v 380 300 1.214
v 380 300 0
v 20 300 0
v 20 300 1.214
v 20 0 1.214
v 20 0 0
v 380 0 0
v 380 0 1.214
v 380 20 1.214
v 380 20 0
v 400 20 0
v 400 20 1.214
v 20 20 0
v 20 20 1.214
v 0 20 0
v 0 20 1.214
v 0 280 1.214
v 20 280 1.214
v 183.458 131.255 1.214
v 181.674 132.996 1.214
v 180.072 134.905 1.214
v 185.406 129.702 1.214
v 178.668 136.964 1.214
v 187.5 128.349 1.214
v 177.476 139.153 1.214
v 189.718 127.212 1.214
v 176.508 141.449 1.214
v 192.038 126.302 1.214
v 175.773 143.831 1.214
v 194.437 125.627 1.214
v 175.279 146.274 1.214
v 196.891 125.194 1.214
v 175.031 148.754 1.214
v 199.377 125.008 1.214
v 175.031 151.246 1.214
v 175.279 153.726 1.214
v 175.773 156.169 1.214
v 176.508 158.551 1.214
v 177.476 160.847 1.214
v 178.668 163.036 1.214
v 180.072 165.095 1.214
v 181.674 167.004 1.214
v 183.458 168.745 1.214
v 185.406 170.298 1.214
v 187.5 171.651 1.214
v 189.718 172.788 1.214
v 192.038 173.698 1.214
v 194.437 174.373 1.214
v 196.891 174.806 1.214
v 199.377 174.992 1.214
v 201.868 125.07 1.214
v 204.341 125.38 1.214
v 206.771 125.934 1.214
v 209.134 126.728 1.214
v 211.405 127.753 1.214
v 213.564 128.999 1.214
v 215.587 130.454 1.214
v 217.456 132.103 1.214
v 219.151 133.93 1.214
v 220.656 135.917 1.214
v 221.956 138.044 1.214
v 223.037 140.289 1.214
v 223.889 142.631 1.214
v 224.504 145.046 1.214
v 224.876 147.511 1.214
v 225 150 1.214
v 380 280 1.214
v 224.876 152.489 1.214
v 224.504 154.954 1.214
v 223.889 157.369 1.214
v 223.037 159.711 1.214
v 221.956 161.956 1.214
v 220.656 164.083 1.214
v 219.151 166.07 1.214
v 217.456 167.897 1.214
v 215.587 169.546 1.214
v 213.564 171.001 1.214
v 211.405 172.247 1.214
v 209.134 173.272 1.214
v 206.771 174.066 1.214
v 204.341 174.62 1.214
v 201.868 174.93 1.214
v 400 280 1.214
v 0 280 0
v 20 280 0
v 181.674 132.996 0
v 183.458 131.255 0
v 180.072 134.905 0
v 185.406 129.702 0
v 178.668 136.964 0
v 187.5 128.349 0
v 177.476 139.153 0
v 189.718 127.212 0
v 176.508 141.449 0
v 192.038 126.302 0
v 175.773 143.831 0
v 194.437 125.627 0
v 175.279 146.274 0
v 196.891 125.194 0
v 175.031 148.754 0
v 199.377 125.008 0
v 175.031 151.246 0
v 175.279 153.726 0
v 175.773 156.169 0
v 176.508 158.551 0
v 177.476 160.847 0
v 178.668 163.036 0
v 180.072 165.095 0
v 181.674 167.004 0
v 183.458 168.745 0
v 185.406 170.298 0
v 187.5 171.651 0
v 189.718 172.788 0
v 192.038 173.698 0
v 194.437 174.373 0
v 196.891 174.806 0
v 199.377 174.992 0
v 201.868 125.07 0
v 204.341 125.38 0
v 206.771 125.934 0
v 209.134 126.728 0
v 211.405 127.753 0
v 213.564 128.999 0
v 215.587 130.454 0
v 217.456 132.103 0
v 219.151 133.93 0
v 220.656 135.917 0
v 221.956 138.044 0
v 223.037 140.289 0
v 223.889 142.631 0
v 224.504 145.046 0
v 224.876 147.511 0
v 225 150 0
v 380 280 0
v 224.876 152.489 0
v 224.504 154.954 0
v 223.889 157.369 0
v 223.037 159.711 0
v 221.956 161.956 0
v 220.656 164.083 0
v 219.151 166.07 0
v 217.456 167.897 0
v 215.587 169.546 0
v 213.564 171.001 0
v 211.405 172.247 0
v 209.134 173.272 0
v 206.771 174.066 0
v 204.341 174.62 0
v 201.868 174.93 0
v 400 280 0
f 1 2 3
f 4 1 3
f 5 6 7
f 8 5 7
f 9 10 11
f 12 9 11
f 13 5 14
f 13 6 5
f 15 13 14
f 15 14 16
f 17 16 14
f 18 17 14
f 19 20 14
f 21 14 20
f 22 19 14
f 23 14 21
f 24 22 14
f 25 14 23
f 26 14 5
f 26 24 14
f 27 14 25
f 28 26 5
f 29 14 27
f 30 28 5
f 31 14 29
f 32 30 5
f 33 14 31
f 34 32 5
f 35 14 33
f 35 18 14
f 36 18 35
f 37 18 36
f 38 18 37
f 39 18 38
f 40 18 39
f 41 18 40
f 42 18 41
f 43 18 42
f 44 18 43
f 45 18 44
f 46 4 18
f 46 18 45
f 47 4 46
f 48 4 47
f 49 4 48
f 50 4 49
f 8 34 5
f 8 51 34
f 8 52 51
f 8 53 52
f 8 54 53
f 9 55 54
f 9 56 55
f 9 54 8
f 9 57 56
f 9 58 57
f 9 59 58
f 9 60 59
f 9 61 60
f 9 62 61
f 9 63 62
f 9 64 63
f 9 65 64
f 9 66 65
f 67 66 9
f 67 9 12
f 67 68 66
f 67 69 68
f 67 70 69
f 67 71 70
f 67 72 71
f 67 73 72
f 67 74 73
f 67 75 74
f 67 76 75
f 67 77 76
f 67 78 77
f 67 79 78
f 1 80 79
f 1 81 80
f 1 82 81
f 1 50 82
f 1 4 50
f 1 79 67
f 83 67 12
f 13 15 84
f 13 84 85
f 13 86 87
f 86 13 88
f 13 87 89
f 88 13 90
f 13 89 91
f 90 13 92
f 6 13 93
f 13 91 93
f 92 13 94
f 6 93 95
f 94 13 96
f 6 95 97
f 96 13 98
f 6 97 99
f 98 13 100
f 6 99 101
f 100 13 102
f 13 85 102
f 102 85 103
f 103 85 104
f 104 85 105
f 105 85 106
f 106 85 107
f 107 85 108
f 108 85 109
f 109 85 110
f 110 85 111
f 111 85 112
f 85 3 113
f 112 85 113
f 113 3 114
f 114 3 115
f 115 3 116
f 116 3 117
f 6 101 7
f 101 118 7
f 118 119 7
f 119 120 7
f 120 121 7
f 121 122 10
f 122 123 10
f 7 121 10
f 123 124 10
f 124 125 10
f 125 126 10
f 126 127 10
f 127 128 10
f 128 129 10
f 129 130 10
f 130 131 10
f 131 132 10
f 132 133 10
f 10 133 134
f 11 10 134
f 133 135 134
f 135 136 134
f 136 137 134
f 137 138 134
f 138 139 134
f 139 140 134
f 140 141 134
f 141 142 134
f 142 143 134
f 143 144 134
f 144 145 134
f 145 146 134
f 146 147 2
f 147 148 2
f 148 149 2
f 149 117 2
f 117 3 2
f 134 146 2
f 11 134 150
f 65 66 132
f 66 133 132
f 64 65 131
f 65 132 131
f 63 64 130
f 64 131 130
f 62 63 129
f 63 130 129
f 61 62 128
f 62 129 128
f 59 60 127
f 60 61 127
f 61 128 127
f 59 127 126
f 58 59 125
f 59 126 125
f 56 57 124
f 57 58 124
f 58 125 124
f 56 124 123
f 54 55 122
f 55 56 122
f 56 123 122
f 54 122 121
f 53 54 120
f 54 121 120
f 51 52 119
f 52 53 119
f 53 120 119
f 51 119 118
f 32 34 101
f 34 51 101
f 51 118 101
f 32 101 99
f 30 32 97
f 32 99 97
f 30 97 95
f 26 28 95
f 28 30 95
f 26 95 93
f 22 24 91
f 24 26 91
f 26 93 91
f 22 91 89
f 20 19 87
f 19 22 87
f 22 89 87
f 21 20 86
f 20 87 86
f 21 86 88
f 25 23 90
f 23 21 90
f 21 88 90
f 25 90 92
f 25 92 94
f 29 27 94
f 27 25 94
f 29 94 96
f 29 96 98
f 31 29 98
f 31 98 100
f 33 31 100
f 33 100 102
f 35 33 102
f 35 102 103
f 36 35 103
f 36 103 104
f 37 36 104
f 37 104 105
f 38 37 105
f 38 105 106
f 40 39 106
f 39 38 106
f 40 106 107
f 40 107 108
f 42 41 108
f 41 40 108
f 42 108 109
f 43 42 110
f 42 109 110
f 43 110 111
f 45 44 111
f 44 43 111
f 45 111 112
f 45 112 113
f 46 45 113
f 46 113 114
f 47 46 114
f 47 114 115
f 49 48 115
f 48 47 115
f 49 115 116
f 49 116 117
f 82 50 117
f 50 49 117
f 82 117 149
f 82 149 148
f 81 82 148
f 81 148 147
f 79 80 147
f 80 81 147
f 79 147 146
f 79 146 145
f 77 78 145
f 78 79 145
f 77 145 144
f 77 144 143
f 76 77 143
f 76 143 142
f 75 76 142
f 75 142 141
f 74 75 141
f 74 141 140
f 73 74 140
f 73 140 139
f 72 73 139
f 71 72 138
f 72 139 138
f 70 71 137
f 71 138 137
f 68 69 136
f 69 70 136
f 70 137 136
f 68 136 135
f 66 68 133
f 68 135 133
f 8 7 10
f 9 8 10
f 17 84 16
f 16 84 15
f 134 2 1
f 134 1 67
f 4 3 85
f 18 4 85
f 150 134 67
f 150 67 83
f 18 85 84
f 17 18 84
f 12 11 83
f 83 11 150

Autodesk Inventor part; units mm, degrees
ref_plane "YZ Plane" through (0, 0, 0) normal (1, 0, 0) x (0, 1, 0)
ref_plane "XZ Plane" through (0, 0, 0) normal (0, 1, 0) x (-1, 0, 0)
ref_plane "XY Plane" through (0, 0, 0) normal (0, 0, 1) x (1, 0, 0)
sketch "Sketch4" plane through (0, 0, 0) normal (0, 0, 1) x (1, 0, 0)
  line L0 (0, 0) -> (400, 0)
  line L1 (400, 0) -> (400, 300)
  line L2 (400, 300) -> (0, 300)
  line L3 (0, 300) -> (0, 0)
  dimension "d9" = 400
  dimension "d10" = 300
extrude "Plate2" add sketch "Sketch4" along normal blind 1.214
sketch "Sketch6" plane through (0, 0, 0) normal (0, 0, 1) x (1, 0, 0)
  line L0 (400, 0) -> (0, 0) projected
  line L1 (0, 300) -> (0, 0) projected
  circle A0 centre (200, 150) radius 25
  dimension "d13" = 50
extrude "Cut3" cut sketch "Sketch6" along normal blind 1.214
sketch "Sketch7" plane through (0, 0, 0) normal (0, 0, 1) x (1, 0, 0)
  line L0 (0, 0) -> (20, 0)
  line L1 (20, 0) -> (20, 20)
  line L2 (20, 20) -> (0, 20)
  line L3 (0, 20) -> (0, 0)
  dimension "d16" = 20
  dimension "d17" = 20
extrude "Cut4" cut sketch "Sketch7" along normal blind 1.214
sketch "Sketch8" plane through (0, 0, 0) normal (0, 0, 1) x (1, 0, 0)
  line L0 (400, 0) -> (400, 300) projected
  line L1 (400, 0) -> (380, 0)
  line L2 (380, 0) -> (380, 20)
  line L3 (380, 20) -> (400, 20)
  line L4 (400, 20) -> (400, 0)
  line L5 (400, 300) -> (380, 300)
  line L6 (380, 300) -> (380, 280)
  line L7 (380, 280) -> (400, 280)
  line L8 (400, 280) -> (400, 300)
  line L9 (400, 300) -> (0, 300) projected
  line L10 (0, 300) -> (20, 300)
  line L11 (20, 300) -> (20, 280)
  line L12 (20, 280) -> (0, 280)
  line L13 (0, 280) -> (0, 300)
  point P0 (0, 0)
  dimension "d20" = 20
  dimension "d21" = 20
  dimension "d22" = 20
  dimension "d23" = 20
  dimension "d24" = 20
  dimension "d25" = 20
extrude "Cut5" cut sketch "Sketch8" along normal blind 1.214
equation "\"d14\" = Thickness"
equation "\"d18\" = Thickness"
equation "\"d26\" = Thickness"
equation "\"BendRadius\" = Thickness"
equation "\"BendReliefWidth\" = Thickness"
equation "\"BendReliefDepth\" = 0.5 * Thickness"
equation "\"CornerReliefSize\" = 4 * Thickness"
equation "\"MinimumRemnant\" = 2 * Thickness"
equation "\"TransitionRadius\" = BendRadius"
equation "\"JacobiRadiusSize\" = BendRadius"
equation "\"GapSize\" = Thickness"
equation "\"d2\" = BendRadius"
equation "\"d11\" = BendRadius"
equation "\"Thickness\" = 1.214"
properties part number "FrameSheetLaserViewport" material "Steel, Galvanized"
